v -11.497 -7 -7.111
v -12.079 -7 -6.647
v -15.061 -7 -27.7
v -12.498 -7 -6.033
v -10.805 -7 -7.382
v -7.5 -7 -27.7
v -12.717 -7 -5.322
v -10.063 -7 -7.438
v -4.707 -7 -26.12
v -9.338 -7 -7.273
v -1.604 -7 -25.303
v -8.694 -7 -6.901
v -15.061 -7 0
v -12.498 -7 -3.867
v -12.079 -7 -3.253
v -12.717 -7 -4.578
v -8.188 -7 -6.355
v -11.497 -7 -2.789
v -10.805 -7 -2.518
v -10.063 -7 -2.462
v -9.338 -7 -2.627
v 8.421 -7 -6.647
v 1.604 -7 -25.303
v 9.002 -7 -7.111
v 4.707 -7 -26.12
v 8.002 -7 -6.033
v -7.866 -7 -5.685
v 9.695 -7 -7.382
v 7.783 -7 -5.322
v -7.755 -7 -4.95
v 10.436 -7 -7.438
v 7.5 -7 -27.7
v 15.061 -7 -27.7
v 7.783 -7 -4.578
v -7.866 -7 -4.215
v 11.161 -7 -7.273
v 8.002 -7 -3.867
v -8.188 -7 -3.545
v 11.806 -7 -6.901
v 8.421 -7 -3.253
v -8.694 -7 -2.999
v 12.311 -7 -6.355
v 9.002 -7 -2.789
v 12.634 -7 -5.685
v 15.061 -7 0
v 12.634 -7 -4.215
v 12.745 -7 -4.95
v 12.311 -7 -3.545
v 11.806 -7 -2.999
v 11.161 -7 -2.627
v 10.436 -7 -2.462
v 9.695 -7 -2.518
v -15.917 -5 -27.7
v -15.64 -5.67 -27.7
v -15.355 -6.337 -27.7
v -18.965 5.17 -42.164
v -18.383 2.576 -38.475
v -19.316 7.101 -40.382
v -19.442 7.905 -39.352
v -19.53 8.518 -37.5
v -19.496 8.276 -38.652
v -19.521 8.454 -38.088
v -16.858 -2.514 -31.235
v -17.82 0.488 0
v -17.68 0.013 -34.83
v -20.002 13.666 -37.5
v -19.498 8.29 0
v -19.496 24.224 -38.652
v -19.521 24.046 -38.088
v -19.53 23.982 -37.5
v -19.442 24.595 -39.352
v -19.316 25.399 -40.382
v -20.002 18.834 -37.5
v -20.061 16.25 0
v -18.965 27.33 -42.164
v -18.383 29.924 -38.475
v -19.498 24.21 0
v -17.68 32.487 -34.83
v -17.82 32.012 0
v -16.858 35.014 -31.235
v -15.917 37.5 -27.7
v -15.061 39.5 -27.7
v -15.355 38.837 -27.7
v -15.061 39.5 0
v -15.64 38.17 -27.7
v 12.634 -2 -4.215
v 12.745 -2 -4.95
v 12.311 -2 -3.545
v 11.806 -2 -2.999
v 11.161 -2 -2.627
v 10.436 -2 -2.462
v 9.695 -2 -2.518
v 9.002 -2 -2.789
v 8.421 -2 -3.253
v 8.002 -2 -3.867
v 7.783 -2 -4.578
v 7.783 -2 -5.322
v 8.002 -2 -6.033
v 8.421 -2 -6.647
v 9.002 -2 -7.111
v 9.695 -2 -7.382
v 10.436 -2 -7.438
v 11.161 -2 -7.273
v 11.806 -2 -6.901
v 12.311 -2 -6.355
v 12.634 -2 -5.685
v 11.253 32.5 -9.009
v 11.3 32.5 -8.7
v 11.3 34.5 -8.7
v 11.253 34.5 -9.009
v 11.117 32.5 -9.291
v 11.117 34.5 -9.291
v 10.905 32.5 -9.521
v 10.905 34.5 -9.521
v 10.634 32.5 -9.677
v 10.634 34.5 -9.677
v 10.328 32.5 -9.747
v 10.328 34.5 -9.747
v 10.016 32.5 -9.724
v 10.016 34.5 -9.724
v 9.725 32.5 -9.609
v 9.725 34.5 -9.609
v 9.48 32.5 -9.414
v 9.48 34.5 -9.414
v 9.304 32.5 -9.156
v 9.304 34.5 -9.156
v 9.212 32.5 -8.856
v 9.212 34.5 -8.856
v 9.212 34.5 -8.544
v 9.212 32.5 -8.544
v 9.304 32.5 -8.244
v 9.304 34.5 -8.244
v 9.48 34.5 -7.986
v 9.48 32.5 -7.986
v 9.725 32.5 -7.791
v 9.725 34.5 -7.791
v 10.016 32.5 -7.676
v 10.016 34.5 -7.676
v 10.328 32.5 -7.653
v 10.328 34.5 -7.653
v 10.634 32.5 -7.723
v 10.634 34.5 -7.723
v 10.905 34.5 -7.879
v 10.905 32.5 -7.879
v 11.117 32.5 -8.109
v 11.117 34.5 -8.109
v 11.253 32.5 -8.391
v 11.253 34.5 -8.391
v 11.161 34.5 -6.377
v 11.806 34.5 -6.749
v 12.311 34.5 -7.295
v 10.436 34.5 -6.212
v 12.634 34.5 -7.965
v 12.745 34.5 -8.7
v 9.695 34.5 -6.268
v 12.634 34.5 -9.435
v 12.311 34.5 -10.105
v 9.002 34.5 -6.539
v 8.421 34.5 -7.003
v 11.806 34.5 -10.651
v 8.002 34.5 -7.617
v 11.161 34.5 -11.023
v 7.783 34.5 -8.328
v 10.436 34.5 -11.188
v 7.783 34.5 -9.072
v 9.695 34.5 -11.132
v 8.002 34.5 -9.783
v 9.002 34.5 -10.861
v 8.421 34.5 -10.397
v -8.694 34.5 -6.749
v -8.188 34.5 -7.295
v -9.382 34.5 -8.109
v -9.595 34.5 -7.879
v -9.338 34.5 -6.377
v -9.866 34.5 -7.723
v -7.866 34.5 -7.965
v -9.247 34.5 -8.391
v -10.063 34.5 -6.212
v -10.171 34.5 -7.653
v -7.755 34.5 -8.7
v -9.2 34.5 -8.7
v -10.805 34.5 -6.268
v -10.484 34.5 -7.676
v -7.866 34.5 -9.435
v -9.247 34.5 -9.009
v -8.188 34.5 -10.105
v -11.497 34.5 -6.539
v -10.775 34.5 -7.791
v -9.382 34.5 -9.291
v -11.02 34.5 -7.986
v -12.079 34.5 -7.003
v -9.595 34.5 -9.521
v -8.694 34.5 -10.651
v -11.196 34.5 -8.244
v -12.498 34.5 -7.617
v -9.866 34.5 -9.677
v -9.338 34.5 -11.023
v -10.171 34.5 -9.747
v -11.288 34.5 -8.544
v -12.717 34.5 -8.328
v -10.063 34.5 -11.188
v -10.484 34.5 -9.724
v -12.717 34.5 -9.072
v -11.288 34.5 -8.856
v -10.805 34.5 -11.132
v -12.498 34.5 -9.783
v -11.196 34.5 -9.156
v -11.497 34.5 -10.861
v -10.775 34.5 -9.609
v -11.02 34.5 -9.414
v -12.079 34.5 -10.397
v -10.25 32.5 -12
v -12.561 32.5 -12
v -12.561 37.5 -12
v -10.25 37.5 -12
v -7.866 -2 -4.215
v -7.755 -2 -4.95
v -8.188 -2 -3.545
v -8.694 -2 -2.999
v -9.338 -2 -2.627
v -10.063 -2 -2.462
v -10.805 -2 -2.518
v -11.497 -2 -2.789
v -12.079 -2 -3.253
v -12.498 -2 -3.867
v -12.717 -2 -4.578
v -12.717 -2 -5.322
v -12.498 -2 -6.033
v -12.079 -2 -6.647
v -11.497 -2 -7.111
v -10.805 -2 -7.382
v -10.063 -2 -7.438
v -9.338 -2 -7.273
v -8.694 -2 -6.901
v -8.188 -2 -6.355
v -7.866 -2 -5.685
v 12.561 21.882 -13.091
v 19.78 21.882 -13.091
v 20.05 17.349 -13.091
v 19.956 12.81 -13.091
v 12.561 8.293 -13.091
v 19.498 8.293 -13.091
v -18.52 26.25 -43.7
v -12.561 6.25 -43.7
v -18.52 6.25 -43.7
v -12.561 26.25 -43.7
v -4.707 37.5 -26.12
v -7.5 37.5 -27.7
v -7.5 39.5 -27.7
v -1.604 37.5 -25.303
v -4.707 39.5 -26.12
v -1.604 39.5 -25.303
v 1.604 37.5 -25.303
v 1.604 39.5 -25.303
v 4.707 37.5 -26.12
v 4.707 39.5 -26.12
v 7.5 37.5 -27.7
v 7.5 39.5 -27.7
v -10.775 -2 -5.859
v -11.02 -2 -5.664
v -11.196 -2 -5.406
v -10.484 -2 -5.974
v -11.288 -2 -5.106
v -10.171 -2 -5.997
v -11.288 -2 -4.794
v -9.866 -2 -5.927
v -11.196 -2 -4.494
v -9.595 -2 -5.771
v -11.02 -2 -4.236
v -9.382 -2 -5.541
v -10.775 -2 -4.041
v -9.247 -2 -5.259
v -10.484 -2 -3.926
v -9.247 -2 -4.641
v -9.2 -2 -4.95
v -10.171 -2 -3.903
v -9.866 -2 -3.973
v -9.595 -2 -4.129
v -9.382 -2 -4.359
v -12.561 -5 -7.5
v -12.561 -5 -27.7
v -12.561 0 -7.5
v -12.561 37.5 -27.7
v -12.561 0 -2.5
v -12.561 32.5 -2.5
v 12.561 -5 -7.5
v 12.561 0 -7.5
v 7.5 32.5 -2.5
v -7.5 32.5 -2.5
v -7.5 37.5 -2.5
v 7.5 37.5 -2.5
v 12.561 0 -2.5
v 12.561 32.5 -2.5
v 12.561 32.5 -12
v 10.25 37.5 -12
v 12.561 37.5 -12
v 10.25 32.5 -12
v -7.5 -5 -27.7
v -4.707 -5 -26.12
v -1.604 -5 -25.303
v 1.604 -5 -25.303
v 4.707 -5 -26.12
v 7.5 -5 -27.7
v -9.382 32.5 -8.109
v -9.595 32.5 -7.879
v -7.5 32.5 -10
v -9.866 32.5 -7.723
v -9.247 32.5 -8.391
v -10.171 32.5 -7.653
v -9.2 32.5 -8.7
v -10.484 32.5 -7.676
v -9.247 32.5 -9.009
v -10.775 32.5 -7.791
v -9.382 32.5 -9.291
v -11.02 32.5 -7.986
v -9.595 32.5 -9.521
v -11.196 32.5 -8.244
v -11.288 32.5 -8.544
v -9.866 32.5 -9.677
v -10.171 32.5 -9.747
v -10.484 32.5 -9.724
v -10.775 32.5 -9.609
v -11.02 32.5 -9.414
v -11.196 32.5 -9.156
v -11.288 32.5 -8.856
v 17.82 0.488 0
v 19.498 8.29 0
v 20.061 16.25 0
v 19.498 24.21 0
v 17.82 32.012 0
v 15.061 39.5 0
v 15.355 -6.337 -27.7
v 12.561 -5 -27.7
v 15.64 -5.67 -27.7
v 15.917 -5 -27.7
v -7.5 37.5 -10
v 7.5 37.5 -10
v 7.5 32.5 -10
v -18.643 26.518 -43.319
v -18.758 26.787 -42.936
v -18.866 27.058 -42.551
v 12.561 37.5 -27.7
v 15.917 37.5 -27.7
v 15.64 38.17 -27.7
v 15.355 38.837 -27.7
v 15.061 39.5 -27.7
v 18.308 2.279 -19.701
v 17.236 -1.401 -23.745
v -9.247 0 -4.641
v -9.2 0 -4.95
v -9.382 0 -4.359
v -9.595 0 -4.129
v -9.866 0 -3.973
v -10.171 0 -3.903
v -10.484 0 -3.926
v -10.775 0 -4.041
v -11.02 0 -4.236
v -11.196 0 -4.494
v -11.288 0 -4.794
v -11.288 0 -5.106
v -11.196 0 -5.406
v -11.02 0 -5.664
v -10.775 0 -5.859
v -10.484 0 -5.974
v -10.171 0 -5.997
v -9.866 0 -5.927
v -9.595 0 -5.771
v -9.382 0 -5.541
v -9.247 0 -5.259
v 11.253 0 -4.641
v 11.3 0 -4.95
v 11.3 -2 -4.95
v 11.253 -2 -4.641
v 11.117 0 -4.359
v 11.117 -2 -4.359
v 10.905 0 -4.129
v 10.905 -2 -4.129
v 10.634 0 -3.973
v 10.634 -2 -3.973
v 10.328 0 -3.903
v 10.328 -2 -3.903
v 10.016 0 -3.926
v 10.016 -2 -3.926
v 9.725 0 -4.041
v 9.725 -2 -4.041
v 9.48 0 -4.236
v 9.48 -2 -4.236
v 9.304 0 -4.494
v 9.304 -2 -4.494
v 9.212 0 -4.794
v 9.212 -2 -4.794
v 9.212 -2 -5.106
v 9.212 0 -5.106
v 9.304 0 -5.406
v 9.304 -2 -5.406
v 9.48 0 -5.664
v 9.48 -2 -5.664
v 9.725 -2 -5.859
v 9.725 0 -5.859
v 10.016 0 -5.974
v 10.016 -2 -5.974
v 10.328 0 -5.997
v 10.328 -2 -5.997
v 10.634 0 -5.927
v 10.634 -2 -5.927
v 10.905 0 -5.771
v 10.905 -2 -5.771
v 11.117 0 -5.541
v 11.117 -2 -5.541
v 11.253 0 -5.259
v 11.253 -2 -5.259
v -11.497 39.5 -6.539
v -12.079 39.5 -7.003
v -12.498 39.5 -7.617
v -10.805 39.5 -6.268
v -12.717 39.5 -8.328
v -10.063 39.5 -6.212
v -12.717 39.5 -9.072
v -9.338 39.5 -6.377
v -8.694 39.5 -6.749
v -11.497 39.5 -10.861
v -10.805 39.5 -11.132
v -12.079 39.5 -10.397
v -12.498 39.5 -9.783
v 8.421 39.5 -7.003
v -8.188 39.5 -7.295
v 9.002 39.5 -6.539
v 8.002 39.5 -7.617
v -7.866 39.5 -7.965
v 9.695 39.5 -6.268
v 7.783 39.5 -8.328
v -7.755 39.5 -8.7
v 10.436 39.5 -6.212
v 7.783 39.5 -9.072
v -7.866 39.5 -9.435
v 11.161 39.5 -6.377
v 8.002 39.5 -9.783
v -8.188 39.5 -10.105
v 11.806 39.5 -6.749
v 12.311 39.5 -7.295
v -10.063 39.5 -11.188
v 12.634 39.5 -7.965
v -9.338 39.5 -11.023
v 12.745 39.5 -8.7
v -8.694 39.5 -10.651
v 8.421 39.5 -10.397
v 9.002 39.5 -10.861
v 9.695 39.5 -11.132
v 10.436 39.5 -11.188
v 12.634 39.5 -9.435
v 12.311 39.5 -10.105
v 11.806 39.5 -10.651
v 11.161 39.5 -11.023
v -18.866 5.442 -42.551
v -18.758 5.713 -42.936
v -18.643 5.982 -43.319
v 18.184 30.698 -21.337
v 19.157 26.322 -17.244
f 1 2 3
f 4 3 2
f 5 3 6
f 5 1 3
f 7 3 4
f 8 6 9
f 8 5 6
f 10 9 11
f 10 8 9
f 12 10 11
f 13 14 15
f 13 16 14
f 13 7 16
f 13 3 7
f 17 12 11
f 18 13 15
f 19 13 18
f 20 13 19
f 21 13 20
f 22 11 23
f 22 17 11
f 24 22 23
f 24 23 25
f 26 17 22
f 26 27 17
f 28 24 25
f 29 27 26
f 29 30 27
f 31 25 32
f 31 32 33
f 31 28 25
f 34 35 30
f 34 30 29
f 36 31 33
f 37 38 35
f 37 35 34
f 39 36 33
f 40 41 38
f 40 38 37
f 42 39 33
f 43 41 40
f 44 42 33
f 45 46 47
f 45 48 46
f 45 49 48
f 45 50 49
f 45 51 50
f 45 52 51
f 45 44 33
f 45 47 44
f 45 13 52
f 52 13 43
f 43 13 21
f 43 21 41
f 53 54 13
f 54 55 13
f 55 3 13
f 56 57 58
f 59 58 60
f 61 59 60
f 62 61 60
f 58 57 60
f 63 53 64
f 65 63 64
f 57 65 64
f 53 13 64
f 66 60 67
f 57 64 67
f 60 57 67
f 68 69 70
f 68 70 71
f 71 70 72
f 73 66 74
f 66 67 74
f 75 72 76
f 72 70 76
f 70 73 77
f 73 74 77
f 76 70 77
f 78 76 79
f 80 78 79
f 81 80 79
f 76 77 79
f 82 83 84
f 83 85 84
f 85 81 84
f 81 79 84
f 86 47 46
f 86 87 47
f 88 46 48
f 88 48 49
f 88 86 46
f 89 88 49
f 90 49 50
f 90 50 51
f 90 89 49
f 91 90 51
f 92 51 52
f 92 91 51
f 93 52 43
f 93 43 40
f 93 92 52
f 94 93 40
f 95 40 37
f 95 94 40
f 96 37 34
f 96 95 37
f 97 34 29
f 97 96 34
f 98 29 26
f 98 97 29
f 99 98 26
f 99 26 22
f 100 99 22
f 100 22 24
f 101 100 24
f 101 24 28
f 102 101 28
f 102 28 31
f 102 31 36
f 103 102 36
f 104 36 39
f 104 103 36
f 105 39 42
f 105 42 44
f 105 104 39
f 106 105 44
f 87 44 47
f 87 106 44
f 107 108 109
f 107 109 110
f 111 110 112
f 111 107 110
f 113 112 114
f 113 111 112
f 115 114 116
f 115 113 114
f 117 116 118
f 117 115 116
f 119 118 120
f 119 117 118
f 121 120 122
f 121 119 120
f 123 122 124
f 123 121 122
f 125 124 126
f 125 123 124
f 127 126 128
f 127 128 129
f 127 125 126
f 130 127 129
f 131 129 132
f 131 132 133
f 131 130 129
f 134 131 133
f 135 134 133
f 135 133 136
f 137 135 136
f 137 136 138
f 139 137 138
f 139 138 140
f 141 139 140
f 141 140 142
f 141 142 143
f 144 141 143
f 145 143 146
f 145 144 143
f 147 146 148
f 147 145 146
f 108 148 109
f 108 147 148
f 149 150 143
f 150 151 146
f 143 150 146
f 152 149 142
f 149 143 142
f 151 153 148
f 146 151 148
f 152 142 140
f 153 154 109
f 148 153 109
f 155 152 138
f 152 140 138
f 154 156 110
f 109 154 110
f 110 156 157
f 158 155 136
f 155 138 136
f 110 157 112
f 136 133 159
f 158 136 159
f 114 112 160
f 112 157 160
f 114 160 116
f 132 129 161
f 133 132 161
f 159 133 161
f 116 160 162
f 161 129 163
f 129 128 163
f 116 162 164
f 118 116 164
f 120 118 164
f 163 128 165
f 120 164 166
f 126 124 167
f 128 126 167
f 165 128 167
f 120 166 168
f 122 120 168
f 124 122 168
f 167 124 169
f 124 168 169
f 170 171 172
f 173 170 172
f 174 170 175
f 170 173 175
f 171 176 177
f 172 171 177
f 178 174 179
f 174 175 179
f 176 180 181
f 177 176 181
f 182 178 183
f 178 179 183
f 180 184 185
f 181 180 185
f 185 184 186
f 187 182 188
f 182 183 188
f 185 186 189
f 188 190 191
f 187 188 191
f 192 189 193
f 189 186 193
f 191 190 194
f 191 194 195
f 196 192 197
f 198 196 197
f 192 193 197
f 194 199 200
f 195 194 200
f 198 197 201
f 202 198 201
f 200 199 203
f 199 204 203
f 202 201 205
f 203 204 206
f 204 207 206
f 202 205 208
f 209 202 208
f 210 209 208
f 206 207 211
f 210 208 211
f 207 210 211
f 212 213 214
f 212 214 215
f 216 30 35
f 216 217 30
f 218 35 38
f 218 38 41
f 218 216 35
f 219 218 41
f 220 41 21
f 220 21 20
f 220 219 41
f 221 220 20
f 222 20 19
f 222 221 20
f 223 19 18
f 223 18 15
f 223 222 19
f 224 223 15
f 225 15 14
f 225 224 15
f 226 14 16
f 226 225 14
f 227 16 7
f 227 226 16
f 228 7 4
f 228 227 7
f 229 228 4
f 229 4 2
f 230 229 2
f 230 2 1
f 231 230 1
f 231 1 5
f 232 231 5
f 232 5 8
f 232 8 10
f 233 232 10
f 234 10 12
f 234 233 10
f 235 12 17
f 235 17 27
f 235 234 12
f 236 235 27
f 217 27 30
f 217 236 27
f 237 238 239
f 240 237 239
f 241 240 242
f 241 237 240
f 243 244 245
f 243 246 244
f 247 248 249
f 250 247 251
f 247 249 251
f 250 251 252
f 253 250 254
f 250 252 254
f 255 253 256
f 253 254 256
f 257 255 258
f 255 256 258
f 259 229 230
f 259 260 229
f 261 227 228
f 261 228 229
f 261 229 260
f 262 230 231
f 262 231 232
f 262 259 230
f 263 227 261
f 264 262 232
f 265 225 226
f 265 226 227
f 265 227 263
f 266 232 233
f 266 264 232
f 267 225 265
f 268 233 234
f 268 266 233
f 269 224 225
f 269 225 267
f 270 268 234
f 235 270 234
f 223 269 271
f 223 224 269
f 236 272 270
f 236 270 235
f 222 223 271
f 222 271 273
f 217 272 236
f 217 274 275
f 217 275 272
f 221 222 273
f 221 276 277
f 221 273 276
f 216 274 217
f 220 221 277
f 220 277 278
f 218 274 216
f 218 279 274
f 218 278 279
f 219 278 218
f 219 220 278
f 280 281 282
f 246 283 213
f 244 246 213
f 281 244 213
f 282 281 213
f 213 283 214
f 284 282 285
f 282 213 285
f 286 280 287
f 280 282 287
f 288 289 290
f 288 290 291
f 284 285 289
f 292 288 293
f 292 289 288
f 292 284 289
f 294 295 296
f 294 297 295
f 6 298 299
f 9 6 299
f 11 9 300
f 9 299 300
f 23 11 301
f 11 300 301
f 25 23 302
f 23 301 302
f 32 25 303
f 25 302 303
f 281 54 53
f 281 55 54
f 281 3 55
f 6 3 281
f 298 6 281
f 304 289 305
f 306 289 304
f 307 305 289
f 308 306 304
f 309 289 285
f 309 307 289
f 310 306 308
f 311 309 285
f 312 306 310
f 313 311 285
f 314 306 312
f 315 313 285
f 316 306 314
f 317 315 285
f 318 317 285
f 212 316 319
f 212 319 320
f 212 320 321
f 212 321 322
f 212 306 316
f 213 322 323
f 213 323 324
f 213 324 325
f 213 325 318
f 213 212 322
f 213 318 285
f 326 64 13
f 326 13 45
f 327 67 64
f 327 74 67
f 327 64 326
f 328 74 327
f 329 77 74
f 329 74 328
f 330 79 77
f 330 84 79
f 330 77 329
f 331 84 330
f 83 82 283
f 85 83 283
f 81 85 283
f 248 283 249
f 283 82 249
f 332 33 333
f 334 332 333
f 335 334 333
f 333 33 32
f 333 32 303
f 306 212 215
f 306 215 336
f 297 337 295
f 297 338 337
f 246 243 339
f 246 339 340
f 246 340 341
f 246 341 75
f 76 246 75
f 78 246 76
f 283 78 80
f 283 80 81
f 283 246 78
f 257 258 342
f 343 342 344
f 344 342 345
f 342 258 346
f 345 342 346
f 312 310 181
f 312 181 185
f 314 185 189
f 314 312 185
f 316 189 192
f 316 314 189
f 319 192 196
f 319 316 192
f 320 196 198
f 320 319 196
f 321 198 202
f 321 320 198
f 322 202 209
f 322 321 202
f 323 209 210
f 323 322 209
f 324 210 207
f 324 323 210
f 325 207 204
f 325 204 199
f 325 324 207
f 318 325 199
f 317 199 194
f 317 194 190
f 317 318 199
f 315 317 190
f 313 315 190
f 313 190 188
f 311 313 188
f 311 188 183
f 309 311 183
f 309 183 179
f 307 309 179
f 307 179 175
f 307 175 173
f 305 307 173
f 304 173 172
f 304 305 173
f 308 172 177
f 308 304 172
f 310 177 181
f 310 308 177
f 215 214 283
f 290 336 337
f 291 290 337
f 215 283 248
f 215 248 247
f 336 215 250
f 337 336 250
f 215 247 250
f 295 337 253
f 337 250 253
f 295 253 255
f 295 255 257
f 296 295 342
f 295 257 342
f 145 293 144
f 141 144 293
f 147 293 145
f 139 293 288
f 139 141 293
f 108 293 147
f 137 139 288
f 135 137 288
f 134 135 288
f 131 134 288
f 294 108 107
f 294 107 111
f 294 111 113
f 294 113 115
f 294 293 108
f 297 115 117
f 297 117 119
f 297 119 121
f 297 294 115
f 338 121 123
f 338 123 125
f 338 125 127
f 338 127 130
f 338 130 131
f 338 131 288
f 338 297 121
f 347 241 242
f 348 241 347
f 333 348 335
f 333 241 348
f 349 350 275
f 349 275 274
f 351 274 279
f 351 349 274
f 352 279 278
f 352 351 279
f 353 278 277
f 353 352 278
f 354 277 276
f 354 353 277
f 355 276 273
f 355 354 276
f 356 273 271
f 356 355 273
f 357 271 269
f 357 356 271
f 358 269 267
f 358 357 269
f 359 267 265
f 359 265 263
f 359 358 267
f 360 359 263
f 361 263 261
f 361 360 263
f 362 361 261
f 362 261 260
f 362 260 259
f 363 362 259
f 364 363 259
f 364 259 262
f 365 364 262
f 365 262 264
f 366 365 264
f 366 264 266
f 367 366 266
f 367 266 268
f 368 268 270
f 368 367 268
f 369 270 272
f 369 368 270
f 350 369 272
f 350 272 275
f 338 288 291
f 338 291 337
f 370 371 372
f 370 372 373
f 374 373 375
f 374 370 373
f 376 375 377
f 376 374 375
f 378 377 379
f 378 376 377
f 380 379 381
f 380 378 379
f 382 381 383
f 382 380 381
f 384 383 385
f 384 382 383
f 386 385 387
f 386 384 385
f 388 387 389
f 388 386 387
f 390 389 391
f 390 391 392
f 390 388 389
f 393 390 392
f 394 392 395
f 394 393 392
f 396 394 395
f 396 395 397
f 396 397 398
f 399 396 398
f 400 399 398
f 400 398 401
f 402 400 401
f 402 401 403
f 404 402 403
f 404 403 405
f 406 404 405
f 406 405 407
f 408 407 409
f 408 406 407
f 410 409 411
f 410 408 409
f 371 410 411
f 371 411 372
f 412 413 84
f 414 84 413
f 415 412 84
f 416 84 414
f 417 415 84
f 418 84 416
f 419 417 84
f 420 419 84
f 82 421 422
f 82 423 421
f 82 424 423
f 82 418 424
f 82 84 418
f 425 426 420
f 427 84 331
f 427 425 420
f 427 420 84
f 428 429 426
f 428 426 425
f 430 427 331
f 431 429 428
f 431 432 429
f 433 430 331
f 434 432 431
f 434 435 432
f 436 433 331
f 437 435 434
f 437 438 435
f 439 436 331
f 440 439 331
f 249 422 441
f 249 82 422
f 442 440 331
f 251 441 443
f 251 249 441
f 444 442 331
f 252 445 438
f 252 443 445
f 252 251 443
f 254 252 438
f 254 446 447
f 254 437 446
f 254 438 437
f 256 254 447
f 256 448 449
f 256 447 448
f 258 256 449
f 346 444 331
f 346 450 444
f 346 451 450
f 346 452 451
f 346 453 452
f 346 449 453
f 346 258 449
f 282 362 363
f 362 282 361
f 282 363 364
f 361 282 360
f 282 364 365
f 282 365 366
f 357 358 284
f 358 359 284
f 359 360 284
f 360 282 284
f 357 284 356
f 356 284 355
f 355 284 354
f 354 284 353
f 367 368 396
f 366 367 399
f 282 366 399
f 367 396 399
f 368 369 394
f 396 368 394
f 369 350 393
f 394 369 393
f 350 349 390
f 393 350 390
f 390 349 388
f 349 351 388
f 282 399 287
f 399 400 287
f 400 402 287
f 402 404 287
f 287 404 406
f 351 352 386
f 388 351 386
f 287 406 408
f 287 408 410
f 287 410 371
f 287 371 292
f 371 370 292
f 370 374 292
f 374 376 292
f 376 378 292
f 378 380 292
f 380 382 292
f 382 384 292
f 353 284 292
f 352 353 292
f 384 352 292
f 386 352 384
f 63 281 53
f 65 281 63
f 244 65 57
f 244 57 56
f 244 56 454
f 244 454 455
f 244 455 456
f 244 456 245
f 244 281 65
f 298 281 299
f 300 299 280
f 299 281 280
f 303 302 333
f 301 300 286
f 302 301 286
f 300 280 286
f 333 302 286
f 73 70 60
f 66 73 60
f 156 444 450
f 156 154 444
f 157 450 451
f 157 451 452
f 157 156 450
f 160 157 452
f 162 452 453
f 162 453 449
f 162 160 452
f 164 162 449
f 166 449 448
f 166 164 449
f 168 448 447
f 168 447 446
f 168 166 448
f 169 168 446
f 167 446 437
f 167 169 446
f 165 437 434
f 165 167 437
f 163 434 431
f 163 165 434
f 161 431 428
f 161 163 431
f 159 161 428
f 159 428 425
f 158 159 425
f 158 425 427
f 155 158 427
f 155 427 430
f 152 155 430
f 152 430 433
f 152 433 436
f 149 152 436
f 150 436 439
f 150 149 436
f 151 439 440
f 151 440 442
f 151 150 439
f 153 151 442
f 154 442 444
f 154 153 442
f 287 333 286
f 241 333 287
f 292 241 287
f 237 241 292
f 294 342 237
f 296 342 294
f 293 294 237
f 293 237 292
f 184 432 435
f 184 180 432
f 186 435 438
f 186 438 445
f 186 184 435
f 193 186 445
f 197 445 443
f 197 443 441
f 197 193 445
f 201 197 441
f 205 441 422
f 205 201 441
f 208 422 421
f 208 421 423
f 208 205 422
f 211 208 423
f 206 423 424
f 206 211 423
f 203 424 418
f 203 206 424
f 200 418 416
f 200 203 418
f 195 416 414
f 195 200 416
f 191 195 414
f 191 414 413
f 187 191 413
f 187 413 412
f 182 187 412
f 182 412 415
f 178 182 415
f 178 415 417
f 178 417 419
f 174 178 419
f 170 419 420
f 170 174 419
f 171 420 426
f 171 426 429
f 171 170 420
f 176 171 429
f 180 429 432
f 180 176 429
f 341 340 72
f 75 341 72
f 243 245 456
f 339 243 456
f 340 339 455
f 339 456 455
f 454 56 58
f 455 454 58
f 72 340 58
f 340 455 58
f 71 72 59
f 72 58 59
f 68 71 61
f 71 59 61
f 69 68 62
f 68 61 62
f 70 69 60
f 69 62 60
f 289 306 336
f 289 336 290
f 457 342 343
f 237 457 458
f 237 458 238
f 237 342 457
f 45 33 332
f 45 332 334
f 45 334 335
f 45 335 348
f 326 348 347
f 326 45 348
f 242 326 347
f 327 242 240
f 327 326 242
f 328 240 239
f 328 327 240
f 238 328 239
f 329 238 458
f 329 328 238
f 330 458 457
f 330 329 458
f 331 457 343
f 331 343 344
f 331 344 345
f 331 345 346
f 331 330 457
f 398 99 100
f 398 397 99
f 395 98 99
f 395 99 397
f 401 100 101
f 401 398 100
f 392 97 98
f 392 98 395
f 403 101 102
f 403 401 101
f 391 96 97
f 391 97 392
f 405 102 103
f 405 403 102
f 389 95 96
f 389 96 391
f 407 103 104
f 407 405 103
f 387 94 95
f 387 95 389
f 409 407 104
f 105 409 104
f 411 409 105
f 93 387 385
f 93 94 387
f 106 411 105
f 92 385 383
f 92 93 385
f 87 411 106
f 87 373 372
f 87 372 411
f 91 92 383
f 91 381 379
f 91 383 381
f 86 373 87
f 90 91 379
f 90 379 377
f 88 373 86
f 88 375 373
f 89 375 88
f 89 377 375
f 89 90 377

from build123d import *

# Parameters (mm, degrees)
BOSS_EXTRUDE1_DEPTH     = 32.5
SKETCH4_R               = 1.05
BOSS_EXTRUDE2_DEPTH     = 2
SKETCH7_R               = 2.495
WIRE_SPACING2_DEPTH     = 3
SKETCH8_W               = 30.122
SKETCH8_H               = 37.7
SKETCH8_R               = 2.495
BOSS_EXTRUDE6_DEPTH     = 2
SKETCH5_R               = 1.05
BOSS_EXTRUDE3_DEPTH     = 2
SKETCH9_R               = 2.495
WIRE_SPACING1_DEPTH     = 3
SKETCH10_W              = 30.122
SKETCH10_H              = 37.7
SKETCH10_R              = 2.495
BOSS_EXTRUDE8_DEPTH     = 2
SKETCH11_R              = 12.5
CUT_EXTRUDE1_DEPTH      = 47.5
SKETCH18_W              = 10
SKETCH18_H              = 10
CUT_EXTRUDE4_DEPTH      = 47.5
BOSS_EXTRUDE10_DEPTH    = 2.5
BOSS_EXTRUDE11_DEPTH    = 2.5
BOSS_EXTRUDE12_DEPTH    = 43.7
CUT_EXTRUDE5_DEPTH      = 21.061
CUT_EXTRUDE5_DEPTH_BACK = 21.061
CUT_EXTRUDE7_DEPTH      = 8.5
CUT_EXTRUDE8_DEPTH      = 47.5


with BuildPart() as part:
    # Sketch2 → Boss-Extrude1 (new body)
    with BuildSketch(Plane(origin=(0, 0, 0), x_dir=(1, 0, 0), z_dir=(0, 1, 0))):
        Polygon((15.061, 0), (15.061, 37.7), (12.561, 37.7), (12.561, 2.5), (-12.561, 2.5), (-12.561, 37.7), (-15.061, 37.7), (-15.061, 0), align=None)
    extrude(amount=BOSS_EXTRUDE1_DEPTH)

    # Sketch4 → Boss-Extrude2 (add)
    with BuildSketch(Plane.XZ):
        Polygon((-15.061, 0), (-15.061, -7.443777264), (-15.061, -37.7), (-12.561, -37.7), (-12.561, -7.5), (12.561, -7.5), (12.561, -37.7), (15.061, -37.7), (15.061, -7.443777264), (15.061, 0), align=None)
        with Locations((-10.2499, -4.95)):
            Circle(SKETCH4_R, mode=Mode.SUBTRACT)
        with Locations((10.2499, -4.95)):
            Circle(SKETCH4_R, mode=Mode.SUBTRACT)
    extrude(amount=BOSS_EXTRUDE2_DEPTH)

    # Sketch7 → Wire spacing2 (add)
    with BuildSketch(Plane.XZ.offset(2)):
        Polygon((-15.061, 0), (-15.061, -37.7), (-12.561, -37.7), (-12.561, -7.5), (12.561, -7.5), (12.561, -37.7), (15.061, -37.7), (15.061, 0), align=None)
        with Locations((-10.2499, -4.95)):
            Circle(SKETCH7_R, mode=Mode.SUBTRACT)
        with Locations((10.2499, -4.95)):
            Circle(SKETCH7_R, mode=Mode.SUBTRACT)
    extrude(amount=WIRE_SPACING2_DEPTH)

    # Sketch8 → Boss-Extrude6 (add)
    with BuildSketch(Plane.XZ.offset(5)):
        with Locations((0, -18.85)):
            Rectangle(SKETCH8_W, SKETCH8_H)
        with Locations((-10.2499, -4.95)):
            Circle(SKETCH8_R, mode=Mode.SUBTRACT)
        with Locations((10.2499, -4.95)):
            Circle(SKETCH8_R, mode=Mode.SUBTRACT)
    extrude(amount=BOSS_EXTRUDE6_DEPTH)

    # Sketch5 → Boss-Extrude3 (add)
    with BuildSketch(Plane(origin=(0, 32.5, 0), x_dir=(1, 0, 0), z_dir=(0, 1, 0))):
        Polygon((-7.5, 10), (-7.5, 2.5), (7.5, 2.5), (7.5, 10), (10.2499, 12), (12.561, 12), (12.561, 37.7), (15.061, 37.7), (15.061, 0), (-15.061, 0), (-15.061, 37.7), (-12.561, 37.7), (-12.561, 12), (-10.2499, 12), align=None)
        with Locations((-10.2499, 8.7)):
            Circle(SKETCH5_R, mode=Mode.SUBTRACT)
        with Locations((10.2499, 8.7)):
            Circle(SKETCH5_R, mode=Mode.SUBTRACT)
    extrude(amount=BOSS_EXTRUDE3_DEPTH)

    # Sketch9 → Wire spacing1 (add)
    with BuildSketch(Plane(origin=(0, 34.5, 0), x_dir=(1, 0, 0), z_dir=(0, 1, 0))):
        Polygon((-15.061, 0), (-15.061, 37.7), (-12.561, 37.7), (-12.561, 12), (-10.2499, 12), (-7.5, 10), (-7.5, 2.5), (7.5, 2.5), (7.5, 10), (10.2499, 12), (12.561, 12), (12.561, 37.7), (15.061, 37.7), (15.061, 0), align=None)
        with Locations((-10.2499, 8.7)):
            Circle(SKETCH9_R, mode=Mode.SUBTRACT)
        with Locations((10.2499, 8.7)):
            Circle(SKETCH9_R, mode=Mode.SUBTRACT)
    extrude(amount=WIRE_SPACING1_DEPTH)

    # Sketch10 → Boss-Extrude8 (add)
    with BuildSketch(Plane(origin=(0, 37.5, 0), x_dir=(1, 0, 0), z_dir=(0, 1, 0))):
        with Locations((0, 18.85)):
            Rectangle(SKETCH10_W, SKETCH10_H)
        with Locations((-10.2499, 8.7)):
            Circle(SKETCH10_R, mode=Mode.SUBTRACT)
        with Locations((10.2499, 8.7)):
            Circle(SKETCH10_R, mode=Mode.SUBTRACT)
    extrude(amount=BOSS_EXTRUDE8_DEPTH)

    # Sketch11 → Cut-Extrude1 (cut, through all)
    with BuildSketch(Plane(origin=(0, 39.5, 0), x_dir=(1, 0, 0), z_dir=(0, 1, 0))):
        with Locations((0, 37.7)):
            Circle(SKETCH11_R)
    extrude(amount=-CUT_EXTRUDE1_DEPTH, mode=Mode.SUBTRACT)

    # Sketch18 → Cut-Extrude4 (cut, through all)
    with BuildSketch(Plane(origin=(0, 39.5, 0), x_dir=(1, 0, 0), z_dir=(0, 1, 0))):
        with Locations((-10.061, 32.7)):
            Rectangle(SKETCH18_W, SKETCH18_H)
        with Locations((10.061, 32.7)):
            Rectangle(SKETCH18_W, SKETCH18_H)
    extrude(amount=-CUT_EXTRUDE4_DEPTH, mode=Mode.SUBTRACT)

    # Sketch19 → Boss-Extrude10 (add)
    with BuildSketch(Plane.ZY.offset(15.061)):
        Polygon((-27.7, 37.5), (-43.7, 26.25), (-43.7, 6.25), (-27.7, -5), align=None)
    extrude(amount=-BOSS_EXTRUDE10_DEPTH)

    # Sketch20 → Boss-Extrude11 (add)
    with BuildSketch(Plane(origin=(15.061, 0, 0), x_dir=(0, 0, -1), z_dir=(1, 0, 0))):
        Polygon((27.7, 37.5), (43.7, 26.25), (43.7, 6.25), (27.7, -5), align=None)
    extrude(amount=-BOSS_EXTRUDE11_DEPTH)

    # Sketch21 → Boss-Extrude12 (add)
    with BuildSketch(Plane.XY):
        with BuildLine():
            Line((15.061, 39.5), (15.061, -7))
            ThreePointArc((15.061, -7), (20.061, 16.25), (15.061, 39.5))
        make_face()
        with BuildLine():
            Line((-15.061, 39.5), (-15.061, -7))
            ThreePointArc((-15.061, -7), (-20.061, 16.25), (-15.061, 39.5))
        make_face()
    extrude(amount=-BOSS_EXTRUDE12_DEPTH)

    # Sketch22 → Cut-Extrude5 (cut, two sides)
    with BuildSketch(Plane(origin=(0, 0, 0), x_dir=(0, 0, -1), z_dir=(1, 0, 0))) as cut_extrude5_sk:
        Polygon((27.7, 37.5), (27.7, 39.5), (50.372745126, 39.5), (50.372745126, -11.616849197), (27.7, -11.616849197), (27.7, -5), (43.7, 6.25), (43.7, 26.25), align=None)
    extrude(amount=CUT_EXTRUDE5_DEPTH, mode=Mode.SUBTRACT)
    extrude(cut_extrude5_sk.sketch, amount=-CUT_EXTRUDE5_DEPTH_BACK, mode=Mode.SUBTRACT)

    # Sketch23 → Cut-Extrude7 (cut, through all)
    with BuildSketch(Plane.ZY.offset(-12.561)):
        Polygon((-27.7, 37.5), (-13.091239011, 21.881848889), (-13.091239011, 8.292742538), (-27.7, -5), (-48.045036631, -3.33430033), (-49.353078953, 36.560990509), align=None)
    extrude(amount=-CUT_EXTRUDE7_DEPTH, mode=Mode.SUBTRACT)

    # Sketch24 → Cut-Extrude8 (cut, through all)
    with BuildSketch(Plane.XZ.offset(7)):
        with BuildLine():
            Line((-19.53, -76.468982583), (19.53, -77.324698996))
            Line((19.53, -77.324698996), (19.53, -37.5))
            ThreePointArc((19.53, -37.5), (0, -57.03), (-19.53, -37.5))
            Line((-19.53, -37.5), (-36.23071583, -37.5))
            Line((-36.23071583, -37.5), (-36.23071583, -76.468982583))
            Line((-36.23071583, -76.468982583), (-19.53, -76.468982583))
        make_face()
    extrude(amount=-CUT_EXTRUDE8_DEPTH, mode=Mode.SUBTRACT)


solid = part.part
